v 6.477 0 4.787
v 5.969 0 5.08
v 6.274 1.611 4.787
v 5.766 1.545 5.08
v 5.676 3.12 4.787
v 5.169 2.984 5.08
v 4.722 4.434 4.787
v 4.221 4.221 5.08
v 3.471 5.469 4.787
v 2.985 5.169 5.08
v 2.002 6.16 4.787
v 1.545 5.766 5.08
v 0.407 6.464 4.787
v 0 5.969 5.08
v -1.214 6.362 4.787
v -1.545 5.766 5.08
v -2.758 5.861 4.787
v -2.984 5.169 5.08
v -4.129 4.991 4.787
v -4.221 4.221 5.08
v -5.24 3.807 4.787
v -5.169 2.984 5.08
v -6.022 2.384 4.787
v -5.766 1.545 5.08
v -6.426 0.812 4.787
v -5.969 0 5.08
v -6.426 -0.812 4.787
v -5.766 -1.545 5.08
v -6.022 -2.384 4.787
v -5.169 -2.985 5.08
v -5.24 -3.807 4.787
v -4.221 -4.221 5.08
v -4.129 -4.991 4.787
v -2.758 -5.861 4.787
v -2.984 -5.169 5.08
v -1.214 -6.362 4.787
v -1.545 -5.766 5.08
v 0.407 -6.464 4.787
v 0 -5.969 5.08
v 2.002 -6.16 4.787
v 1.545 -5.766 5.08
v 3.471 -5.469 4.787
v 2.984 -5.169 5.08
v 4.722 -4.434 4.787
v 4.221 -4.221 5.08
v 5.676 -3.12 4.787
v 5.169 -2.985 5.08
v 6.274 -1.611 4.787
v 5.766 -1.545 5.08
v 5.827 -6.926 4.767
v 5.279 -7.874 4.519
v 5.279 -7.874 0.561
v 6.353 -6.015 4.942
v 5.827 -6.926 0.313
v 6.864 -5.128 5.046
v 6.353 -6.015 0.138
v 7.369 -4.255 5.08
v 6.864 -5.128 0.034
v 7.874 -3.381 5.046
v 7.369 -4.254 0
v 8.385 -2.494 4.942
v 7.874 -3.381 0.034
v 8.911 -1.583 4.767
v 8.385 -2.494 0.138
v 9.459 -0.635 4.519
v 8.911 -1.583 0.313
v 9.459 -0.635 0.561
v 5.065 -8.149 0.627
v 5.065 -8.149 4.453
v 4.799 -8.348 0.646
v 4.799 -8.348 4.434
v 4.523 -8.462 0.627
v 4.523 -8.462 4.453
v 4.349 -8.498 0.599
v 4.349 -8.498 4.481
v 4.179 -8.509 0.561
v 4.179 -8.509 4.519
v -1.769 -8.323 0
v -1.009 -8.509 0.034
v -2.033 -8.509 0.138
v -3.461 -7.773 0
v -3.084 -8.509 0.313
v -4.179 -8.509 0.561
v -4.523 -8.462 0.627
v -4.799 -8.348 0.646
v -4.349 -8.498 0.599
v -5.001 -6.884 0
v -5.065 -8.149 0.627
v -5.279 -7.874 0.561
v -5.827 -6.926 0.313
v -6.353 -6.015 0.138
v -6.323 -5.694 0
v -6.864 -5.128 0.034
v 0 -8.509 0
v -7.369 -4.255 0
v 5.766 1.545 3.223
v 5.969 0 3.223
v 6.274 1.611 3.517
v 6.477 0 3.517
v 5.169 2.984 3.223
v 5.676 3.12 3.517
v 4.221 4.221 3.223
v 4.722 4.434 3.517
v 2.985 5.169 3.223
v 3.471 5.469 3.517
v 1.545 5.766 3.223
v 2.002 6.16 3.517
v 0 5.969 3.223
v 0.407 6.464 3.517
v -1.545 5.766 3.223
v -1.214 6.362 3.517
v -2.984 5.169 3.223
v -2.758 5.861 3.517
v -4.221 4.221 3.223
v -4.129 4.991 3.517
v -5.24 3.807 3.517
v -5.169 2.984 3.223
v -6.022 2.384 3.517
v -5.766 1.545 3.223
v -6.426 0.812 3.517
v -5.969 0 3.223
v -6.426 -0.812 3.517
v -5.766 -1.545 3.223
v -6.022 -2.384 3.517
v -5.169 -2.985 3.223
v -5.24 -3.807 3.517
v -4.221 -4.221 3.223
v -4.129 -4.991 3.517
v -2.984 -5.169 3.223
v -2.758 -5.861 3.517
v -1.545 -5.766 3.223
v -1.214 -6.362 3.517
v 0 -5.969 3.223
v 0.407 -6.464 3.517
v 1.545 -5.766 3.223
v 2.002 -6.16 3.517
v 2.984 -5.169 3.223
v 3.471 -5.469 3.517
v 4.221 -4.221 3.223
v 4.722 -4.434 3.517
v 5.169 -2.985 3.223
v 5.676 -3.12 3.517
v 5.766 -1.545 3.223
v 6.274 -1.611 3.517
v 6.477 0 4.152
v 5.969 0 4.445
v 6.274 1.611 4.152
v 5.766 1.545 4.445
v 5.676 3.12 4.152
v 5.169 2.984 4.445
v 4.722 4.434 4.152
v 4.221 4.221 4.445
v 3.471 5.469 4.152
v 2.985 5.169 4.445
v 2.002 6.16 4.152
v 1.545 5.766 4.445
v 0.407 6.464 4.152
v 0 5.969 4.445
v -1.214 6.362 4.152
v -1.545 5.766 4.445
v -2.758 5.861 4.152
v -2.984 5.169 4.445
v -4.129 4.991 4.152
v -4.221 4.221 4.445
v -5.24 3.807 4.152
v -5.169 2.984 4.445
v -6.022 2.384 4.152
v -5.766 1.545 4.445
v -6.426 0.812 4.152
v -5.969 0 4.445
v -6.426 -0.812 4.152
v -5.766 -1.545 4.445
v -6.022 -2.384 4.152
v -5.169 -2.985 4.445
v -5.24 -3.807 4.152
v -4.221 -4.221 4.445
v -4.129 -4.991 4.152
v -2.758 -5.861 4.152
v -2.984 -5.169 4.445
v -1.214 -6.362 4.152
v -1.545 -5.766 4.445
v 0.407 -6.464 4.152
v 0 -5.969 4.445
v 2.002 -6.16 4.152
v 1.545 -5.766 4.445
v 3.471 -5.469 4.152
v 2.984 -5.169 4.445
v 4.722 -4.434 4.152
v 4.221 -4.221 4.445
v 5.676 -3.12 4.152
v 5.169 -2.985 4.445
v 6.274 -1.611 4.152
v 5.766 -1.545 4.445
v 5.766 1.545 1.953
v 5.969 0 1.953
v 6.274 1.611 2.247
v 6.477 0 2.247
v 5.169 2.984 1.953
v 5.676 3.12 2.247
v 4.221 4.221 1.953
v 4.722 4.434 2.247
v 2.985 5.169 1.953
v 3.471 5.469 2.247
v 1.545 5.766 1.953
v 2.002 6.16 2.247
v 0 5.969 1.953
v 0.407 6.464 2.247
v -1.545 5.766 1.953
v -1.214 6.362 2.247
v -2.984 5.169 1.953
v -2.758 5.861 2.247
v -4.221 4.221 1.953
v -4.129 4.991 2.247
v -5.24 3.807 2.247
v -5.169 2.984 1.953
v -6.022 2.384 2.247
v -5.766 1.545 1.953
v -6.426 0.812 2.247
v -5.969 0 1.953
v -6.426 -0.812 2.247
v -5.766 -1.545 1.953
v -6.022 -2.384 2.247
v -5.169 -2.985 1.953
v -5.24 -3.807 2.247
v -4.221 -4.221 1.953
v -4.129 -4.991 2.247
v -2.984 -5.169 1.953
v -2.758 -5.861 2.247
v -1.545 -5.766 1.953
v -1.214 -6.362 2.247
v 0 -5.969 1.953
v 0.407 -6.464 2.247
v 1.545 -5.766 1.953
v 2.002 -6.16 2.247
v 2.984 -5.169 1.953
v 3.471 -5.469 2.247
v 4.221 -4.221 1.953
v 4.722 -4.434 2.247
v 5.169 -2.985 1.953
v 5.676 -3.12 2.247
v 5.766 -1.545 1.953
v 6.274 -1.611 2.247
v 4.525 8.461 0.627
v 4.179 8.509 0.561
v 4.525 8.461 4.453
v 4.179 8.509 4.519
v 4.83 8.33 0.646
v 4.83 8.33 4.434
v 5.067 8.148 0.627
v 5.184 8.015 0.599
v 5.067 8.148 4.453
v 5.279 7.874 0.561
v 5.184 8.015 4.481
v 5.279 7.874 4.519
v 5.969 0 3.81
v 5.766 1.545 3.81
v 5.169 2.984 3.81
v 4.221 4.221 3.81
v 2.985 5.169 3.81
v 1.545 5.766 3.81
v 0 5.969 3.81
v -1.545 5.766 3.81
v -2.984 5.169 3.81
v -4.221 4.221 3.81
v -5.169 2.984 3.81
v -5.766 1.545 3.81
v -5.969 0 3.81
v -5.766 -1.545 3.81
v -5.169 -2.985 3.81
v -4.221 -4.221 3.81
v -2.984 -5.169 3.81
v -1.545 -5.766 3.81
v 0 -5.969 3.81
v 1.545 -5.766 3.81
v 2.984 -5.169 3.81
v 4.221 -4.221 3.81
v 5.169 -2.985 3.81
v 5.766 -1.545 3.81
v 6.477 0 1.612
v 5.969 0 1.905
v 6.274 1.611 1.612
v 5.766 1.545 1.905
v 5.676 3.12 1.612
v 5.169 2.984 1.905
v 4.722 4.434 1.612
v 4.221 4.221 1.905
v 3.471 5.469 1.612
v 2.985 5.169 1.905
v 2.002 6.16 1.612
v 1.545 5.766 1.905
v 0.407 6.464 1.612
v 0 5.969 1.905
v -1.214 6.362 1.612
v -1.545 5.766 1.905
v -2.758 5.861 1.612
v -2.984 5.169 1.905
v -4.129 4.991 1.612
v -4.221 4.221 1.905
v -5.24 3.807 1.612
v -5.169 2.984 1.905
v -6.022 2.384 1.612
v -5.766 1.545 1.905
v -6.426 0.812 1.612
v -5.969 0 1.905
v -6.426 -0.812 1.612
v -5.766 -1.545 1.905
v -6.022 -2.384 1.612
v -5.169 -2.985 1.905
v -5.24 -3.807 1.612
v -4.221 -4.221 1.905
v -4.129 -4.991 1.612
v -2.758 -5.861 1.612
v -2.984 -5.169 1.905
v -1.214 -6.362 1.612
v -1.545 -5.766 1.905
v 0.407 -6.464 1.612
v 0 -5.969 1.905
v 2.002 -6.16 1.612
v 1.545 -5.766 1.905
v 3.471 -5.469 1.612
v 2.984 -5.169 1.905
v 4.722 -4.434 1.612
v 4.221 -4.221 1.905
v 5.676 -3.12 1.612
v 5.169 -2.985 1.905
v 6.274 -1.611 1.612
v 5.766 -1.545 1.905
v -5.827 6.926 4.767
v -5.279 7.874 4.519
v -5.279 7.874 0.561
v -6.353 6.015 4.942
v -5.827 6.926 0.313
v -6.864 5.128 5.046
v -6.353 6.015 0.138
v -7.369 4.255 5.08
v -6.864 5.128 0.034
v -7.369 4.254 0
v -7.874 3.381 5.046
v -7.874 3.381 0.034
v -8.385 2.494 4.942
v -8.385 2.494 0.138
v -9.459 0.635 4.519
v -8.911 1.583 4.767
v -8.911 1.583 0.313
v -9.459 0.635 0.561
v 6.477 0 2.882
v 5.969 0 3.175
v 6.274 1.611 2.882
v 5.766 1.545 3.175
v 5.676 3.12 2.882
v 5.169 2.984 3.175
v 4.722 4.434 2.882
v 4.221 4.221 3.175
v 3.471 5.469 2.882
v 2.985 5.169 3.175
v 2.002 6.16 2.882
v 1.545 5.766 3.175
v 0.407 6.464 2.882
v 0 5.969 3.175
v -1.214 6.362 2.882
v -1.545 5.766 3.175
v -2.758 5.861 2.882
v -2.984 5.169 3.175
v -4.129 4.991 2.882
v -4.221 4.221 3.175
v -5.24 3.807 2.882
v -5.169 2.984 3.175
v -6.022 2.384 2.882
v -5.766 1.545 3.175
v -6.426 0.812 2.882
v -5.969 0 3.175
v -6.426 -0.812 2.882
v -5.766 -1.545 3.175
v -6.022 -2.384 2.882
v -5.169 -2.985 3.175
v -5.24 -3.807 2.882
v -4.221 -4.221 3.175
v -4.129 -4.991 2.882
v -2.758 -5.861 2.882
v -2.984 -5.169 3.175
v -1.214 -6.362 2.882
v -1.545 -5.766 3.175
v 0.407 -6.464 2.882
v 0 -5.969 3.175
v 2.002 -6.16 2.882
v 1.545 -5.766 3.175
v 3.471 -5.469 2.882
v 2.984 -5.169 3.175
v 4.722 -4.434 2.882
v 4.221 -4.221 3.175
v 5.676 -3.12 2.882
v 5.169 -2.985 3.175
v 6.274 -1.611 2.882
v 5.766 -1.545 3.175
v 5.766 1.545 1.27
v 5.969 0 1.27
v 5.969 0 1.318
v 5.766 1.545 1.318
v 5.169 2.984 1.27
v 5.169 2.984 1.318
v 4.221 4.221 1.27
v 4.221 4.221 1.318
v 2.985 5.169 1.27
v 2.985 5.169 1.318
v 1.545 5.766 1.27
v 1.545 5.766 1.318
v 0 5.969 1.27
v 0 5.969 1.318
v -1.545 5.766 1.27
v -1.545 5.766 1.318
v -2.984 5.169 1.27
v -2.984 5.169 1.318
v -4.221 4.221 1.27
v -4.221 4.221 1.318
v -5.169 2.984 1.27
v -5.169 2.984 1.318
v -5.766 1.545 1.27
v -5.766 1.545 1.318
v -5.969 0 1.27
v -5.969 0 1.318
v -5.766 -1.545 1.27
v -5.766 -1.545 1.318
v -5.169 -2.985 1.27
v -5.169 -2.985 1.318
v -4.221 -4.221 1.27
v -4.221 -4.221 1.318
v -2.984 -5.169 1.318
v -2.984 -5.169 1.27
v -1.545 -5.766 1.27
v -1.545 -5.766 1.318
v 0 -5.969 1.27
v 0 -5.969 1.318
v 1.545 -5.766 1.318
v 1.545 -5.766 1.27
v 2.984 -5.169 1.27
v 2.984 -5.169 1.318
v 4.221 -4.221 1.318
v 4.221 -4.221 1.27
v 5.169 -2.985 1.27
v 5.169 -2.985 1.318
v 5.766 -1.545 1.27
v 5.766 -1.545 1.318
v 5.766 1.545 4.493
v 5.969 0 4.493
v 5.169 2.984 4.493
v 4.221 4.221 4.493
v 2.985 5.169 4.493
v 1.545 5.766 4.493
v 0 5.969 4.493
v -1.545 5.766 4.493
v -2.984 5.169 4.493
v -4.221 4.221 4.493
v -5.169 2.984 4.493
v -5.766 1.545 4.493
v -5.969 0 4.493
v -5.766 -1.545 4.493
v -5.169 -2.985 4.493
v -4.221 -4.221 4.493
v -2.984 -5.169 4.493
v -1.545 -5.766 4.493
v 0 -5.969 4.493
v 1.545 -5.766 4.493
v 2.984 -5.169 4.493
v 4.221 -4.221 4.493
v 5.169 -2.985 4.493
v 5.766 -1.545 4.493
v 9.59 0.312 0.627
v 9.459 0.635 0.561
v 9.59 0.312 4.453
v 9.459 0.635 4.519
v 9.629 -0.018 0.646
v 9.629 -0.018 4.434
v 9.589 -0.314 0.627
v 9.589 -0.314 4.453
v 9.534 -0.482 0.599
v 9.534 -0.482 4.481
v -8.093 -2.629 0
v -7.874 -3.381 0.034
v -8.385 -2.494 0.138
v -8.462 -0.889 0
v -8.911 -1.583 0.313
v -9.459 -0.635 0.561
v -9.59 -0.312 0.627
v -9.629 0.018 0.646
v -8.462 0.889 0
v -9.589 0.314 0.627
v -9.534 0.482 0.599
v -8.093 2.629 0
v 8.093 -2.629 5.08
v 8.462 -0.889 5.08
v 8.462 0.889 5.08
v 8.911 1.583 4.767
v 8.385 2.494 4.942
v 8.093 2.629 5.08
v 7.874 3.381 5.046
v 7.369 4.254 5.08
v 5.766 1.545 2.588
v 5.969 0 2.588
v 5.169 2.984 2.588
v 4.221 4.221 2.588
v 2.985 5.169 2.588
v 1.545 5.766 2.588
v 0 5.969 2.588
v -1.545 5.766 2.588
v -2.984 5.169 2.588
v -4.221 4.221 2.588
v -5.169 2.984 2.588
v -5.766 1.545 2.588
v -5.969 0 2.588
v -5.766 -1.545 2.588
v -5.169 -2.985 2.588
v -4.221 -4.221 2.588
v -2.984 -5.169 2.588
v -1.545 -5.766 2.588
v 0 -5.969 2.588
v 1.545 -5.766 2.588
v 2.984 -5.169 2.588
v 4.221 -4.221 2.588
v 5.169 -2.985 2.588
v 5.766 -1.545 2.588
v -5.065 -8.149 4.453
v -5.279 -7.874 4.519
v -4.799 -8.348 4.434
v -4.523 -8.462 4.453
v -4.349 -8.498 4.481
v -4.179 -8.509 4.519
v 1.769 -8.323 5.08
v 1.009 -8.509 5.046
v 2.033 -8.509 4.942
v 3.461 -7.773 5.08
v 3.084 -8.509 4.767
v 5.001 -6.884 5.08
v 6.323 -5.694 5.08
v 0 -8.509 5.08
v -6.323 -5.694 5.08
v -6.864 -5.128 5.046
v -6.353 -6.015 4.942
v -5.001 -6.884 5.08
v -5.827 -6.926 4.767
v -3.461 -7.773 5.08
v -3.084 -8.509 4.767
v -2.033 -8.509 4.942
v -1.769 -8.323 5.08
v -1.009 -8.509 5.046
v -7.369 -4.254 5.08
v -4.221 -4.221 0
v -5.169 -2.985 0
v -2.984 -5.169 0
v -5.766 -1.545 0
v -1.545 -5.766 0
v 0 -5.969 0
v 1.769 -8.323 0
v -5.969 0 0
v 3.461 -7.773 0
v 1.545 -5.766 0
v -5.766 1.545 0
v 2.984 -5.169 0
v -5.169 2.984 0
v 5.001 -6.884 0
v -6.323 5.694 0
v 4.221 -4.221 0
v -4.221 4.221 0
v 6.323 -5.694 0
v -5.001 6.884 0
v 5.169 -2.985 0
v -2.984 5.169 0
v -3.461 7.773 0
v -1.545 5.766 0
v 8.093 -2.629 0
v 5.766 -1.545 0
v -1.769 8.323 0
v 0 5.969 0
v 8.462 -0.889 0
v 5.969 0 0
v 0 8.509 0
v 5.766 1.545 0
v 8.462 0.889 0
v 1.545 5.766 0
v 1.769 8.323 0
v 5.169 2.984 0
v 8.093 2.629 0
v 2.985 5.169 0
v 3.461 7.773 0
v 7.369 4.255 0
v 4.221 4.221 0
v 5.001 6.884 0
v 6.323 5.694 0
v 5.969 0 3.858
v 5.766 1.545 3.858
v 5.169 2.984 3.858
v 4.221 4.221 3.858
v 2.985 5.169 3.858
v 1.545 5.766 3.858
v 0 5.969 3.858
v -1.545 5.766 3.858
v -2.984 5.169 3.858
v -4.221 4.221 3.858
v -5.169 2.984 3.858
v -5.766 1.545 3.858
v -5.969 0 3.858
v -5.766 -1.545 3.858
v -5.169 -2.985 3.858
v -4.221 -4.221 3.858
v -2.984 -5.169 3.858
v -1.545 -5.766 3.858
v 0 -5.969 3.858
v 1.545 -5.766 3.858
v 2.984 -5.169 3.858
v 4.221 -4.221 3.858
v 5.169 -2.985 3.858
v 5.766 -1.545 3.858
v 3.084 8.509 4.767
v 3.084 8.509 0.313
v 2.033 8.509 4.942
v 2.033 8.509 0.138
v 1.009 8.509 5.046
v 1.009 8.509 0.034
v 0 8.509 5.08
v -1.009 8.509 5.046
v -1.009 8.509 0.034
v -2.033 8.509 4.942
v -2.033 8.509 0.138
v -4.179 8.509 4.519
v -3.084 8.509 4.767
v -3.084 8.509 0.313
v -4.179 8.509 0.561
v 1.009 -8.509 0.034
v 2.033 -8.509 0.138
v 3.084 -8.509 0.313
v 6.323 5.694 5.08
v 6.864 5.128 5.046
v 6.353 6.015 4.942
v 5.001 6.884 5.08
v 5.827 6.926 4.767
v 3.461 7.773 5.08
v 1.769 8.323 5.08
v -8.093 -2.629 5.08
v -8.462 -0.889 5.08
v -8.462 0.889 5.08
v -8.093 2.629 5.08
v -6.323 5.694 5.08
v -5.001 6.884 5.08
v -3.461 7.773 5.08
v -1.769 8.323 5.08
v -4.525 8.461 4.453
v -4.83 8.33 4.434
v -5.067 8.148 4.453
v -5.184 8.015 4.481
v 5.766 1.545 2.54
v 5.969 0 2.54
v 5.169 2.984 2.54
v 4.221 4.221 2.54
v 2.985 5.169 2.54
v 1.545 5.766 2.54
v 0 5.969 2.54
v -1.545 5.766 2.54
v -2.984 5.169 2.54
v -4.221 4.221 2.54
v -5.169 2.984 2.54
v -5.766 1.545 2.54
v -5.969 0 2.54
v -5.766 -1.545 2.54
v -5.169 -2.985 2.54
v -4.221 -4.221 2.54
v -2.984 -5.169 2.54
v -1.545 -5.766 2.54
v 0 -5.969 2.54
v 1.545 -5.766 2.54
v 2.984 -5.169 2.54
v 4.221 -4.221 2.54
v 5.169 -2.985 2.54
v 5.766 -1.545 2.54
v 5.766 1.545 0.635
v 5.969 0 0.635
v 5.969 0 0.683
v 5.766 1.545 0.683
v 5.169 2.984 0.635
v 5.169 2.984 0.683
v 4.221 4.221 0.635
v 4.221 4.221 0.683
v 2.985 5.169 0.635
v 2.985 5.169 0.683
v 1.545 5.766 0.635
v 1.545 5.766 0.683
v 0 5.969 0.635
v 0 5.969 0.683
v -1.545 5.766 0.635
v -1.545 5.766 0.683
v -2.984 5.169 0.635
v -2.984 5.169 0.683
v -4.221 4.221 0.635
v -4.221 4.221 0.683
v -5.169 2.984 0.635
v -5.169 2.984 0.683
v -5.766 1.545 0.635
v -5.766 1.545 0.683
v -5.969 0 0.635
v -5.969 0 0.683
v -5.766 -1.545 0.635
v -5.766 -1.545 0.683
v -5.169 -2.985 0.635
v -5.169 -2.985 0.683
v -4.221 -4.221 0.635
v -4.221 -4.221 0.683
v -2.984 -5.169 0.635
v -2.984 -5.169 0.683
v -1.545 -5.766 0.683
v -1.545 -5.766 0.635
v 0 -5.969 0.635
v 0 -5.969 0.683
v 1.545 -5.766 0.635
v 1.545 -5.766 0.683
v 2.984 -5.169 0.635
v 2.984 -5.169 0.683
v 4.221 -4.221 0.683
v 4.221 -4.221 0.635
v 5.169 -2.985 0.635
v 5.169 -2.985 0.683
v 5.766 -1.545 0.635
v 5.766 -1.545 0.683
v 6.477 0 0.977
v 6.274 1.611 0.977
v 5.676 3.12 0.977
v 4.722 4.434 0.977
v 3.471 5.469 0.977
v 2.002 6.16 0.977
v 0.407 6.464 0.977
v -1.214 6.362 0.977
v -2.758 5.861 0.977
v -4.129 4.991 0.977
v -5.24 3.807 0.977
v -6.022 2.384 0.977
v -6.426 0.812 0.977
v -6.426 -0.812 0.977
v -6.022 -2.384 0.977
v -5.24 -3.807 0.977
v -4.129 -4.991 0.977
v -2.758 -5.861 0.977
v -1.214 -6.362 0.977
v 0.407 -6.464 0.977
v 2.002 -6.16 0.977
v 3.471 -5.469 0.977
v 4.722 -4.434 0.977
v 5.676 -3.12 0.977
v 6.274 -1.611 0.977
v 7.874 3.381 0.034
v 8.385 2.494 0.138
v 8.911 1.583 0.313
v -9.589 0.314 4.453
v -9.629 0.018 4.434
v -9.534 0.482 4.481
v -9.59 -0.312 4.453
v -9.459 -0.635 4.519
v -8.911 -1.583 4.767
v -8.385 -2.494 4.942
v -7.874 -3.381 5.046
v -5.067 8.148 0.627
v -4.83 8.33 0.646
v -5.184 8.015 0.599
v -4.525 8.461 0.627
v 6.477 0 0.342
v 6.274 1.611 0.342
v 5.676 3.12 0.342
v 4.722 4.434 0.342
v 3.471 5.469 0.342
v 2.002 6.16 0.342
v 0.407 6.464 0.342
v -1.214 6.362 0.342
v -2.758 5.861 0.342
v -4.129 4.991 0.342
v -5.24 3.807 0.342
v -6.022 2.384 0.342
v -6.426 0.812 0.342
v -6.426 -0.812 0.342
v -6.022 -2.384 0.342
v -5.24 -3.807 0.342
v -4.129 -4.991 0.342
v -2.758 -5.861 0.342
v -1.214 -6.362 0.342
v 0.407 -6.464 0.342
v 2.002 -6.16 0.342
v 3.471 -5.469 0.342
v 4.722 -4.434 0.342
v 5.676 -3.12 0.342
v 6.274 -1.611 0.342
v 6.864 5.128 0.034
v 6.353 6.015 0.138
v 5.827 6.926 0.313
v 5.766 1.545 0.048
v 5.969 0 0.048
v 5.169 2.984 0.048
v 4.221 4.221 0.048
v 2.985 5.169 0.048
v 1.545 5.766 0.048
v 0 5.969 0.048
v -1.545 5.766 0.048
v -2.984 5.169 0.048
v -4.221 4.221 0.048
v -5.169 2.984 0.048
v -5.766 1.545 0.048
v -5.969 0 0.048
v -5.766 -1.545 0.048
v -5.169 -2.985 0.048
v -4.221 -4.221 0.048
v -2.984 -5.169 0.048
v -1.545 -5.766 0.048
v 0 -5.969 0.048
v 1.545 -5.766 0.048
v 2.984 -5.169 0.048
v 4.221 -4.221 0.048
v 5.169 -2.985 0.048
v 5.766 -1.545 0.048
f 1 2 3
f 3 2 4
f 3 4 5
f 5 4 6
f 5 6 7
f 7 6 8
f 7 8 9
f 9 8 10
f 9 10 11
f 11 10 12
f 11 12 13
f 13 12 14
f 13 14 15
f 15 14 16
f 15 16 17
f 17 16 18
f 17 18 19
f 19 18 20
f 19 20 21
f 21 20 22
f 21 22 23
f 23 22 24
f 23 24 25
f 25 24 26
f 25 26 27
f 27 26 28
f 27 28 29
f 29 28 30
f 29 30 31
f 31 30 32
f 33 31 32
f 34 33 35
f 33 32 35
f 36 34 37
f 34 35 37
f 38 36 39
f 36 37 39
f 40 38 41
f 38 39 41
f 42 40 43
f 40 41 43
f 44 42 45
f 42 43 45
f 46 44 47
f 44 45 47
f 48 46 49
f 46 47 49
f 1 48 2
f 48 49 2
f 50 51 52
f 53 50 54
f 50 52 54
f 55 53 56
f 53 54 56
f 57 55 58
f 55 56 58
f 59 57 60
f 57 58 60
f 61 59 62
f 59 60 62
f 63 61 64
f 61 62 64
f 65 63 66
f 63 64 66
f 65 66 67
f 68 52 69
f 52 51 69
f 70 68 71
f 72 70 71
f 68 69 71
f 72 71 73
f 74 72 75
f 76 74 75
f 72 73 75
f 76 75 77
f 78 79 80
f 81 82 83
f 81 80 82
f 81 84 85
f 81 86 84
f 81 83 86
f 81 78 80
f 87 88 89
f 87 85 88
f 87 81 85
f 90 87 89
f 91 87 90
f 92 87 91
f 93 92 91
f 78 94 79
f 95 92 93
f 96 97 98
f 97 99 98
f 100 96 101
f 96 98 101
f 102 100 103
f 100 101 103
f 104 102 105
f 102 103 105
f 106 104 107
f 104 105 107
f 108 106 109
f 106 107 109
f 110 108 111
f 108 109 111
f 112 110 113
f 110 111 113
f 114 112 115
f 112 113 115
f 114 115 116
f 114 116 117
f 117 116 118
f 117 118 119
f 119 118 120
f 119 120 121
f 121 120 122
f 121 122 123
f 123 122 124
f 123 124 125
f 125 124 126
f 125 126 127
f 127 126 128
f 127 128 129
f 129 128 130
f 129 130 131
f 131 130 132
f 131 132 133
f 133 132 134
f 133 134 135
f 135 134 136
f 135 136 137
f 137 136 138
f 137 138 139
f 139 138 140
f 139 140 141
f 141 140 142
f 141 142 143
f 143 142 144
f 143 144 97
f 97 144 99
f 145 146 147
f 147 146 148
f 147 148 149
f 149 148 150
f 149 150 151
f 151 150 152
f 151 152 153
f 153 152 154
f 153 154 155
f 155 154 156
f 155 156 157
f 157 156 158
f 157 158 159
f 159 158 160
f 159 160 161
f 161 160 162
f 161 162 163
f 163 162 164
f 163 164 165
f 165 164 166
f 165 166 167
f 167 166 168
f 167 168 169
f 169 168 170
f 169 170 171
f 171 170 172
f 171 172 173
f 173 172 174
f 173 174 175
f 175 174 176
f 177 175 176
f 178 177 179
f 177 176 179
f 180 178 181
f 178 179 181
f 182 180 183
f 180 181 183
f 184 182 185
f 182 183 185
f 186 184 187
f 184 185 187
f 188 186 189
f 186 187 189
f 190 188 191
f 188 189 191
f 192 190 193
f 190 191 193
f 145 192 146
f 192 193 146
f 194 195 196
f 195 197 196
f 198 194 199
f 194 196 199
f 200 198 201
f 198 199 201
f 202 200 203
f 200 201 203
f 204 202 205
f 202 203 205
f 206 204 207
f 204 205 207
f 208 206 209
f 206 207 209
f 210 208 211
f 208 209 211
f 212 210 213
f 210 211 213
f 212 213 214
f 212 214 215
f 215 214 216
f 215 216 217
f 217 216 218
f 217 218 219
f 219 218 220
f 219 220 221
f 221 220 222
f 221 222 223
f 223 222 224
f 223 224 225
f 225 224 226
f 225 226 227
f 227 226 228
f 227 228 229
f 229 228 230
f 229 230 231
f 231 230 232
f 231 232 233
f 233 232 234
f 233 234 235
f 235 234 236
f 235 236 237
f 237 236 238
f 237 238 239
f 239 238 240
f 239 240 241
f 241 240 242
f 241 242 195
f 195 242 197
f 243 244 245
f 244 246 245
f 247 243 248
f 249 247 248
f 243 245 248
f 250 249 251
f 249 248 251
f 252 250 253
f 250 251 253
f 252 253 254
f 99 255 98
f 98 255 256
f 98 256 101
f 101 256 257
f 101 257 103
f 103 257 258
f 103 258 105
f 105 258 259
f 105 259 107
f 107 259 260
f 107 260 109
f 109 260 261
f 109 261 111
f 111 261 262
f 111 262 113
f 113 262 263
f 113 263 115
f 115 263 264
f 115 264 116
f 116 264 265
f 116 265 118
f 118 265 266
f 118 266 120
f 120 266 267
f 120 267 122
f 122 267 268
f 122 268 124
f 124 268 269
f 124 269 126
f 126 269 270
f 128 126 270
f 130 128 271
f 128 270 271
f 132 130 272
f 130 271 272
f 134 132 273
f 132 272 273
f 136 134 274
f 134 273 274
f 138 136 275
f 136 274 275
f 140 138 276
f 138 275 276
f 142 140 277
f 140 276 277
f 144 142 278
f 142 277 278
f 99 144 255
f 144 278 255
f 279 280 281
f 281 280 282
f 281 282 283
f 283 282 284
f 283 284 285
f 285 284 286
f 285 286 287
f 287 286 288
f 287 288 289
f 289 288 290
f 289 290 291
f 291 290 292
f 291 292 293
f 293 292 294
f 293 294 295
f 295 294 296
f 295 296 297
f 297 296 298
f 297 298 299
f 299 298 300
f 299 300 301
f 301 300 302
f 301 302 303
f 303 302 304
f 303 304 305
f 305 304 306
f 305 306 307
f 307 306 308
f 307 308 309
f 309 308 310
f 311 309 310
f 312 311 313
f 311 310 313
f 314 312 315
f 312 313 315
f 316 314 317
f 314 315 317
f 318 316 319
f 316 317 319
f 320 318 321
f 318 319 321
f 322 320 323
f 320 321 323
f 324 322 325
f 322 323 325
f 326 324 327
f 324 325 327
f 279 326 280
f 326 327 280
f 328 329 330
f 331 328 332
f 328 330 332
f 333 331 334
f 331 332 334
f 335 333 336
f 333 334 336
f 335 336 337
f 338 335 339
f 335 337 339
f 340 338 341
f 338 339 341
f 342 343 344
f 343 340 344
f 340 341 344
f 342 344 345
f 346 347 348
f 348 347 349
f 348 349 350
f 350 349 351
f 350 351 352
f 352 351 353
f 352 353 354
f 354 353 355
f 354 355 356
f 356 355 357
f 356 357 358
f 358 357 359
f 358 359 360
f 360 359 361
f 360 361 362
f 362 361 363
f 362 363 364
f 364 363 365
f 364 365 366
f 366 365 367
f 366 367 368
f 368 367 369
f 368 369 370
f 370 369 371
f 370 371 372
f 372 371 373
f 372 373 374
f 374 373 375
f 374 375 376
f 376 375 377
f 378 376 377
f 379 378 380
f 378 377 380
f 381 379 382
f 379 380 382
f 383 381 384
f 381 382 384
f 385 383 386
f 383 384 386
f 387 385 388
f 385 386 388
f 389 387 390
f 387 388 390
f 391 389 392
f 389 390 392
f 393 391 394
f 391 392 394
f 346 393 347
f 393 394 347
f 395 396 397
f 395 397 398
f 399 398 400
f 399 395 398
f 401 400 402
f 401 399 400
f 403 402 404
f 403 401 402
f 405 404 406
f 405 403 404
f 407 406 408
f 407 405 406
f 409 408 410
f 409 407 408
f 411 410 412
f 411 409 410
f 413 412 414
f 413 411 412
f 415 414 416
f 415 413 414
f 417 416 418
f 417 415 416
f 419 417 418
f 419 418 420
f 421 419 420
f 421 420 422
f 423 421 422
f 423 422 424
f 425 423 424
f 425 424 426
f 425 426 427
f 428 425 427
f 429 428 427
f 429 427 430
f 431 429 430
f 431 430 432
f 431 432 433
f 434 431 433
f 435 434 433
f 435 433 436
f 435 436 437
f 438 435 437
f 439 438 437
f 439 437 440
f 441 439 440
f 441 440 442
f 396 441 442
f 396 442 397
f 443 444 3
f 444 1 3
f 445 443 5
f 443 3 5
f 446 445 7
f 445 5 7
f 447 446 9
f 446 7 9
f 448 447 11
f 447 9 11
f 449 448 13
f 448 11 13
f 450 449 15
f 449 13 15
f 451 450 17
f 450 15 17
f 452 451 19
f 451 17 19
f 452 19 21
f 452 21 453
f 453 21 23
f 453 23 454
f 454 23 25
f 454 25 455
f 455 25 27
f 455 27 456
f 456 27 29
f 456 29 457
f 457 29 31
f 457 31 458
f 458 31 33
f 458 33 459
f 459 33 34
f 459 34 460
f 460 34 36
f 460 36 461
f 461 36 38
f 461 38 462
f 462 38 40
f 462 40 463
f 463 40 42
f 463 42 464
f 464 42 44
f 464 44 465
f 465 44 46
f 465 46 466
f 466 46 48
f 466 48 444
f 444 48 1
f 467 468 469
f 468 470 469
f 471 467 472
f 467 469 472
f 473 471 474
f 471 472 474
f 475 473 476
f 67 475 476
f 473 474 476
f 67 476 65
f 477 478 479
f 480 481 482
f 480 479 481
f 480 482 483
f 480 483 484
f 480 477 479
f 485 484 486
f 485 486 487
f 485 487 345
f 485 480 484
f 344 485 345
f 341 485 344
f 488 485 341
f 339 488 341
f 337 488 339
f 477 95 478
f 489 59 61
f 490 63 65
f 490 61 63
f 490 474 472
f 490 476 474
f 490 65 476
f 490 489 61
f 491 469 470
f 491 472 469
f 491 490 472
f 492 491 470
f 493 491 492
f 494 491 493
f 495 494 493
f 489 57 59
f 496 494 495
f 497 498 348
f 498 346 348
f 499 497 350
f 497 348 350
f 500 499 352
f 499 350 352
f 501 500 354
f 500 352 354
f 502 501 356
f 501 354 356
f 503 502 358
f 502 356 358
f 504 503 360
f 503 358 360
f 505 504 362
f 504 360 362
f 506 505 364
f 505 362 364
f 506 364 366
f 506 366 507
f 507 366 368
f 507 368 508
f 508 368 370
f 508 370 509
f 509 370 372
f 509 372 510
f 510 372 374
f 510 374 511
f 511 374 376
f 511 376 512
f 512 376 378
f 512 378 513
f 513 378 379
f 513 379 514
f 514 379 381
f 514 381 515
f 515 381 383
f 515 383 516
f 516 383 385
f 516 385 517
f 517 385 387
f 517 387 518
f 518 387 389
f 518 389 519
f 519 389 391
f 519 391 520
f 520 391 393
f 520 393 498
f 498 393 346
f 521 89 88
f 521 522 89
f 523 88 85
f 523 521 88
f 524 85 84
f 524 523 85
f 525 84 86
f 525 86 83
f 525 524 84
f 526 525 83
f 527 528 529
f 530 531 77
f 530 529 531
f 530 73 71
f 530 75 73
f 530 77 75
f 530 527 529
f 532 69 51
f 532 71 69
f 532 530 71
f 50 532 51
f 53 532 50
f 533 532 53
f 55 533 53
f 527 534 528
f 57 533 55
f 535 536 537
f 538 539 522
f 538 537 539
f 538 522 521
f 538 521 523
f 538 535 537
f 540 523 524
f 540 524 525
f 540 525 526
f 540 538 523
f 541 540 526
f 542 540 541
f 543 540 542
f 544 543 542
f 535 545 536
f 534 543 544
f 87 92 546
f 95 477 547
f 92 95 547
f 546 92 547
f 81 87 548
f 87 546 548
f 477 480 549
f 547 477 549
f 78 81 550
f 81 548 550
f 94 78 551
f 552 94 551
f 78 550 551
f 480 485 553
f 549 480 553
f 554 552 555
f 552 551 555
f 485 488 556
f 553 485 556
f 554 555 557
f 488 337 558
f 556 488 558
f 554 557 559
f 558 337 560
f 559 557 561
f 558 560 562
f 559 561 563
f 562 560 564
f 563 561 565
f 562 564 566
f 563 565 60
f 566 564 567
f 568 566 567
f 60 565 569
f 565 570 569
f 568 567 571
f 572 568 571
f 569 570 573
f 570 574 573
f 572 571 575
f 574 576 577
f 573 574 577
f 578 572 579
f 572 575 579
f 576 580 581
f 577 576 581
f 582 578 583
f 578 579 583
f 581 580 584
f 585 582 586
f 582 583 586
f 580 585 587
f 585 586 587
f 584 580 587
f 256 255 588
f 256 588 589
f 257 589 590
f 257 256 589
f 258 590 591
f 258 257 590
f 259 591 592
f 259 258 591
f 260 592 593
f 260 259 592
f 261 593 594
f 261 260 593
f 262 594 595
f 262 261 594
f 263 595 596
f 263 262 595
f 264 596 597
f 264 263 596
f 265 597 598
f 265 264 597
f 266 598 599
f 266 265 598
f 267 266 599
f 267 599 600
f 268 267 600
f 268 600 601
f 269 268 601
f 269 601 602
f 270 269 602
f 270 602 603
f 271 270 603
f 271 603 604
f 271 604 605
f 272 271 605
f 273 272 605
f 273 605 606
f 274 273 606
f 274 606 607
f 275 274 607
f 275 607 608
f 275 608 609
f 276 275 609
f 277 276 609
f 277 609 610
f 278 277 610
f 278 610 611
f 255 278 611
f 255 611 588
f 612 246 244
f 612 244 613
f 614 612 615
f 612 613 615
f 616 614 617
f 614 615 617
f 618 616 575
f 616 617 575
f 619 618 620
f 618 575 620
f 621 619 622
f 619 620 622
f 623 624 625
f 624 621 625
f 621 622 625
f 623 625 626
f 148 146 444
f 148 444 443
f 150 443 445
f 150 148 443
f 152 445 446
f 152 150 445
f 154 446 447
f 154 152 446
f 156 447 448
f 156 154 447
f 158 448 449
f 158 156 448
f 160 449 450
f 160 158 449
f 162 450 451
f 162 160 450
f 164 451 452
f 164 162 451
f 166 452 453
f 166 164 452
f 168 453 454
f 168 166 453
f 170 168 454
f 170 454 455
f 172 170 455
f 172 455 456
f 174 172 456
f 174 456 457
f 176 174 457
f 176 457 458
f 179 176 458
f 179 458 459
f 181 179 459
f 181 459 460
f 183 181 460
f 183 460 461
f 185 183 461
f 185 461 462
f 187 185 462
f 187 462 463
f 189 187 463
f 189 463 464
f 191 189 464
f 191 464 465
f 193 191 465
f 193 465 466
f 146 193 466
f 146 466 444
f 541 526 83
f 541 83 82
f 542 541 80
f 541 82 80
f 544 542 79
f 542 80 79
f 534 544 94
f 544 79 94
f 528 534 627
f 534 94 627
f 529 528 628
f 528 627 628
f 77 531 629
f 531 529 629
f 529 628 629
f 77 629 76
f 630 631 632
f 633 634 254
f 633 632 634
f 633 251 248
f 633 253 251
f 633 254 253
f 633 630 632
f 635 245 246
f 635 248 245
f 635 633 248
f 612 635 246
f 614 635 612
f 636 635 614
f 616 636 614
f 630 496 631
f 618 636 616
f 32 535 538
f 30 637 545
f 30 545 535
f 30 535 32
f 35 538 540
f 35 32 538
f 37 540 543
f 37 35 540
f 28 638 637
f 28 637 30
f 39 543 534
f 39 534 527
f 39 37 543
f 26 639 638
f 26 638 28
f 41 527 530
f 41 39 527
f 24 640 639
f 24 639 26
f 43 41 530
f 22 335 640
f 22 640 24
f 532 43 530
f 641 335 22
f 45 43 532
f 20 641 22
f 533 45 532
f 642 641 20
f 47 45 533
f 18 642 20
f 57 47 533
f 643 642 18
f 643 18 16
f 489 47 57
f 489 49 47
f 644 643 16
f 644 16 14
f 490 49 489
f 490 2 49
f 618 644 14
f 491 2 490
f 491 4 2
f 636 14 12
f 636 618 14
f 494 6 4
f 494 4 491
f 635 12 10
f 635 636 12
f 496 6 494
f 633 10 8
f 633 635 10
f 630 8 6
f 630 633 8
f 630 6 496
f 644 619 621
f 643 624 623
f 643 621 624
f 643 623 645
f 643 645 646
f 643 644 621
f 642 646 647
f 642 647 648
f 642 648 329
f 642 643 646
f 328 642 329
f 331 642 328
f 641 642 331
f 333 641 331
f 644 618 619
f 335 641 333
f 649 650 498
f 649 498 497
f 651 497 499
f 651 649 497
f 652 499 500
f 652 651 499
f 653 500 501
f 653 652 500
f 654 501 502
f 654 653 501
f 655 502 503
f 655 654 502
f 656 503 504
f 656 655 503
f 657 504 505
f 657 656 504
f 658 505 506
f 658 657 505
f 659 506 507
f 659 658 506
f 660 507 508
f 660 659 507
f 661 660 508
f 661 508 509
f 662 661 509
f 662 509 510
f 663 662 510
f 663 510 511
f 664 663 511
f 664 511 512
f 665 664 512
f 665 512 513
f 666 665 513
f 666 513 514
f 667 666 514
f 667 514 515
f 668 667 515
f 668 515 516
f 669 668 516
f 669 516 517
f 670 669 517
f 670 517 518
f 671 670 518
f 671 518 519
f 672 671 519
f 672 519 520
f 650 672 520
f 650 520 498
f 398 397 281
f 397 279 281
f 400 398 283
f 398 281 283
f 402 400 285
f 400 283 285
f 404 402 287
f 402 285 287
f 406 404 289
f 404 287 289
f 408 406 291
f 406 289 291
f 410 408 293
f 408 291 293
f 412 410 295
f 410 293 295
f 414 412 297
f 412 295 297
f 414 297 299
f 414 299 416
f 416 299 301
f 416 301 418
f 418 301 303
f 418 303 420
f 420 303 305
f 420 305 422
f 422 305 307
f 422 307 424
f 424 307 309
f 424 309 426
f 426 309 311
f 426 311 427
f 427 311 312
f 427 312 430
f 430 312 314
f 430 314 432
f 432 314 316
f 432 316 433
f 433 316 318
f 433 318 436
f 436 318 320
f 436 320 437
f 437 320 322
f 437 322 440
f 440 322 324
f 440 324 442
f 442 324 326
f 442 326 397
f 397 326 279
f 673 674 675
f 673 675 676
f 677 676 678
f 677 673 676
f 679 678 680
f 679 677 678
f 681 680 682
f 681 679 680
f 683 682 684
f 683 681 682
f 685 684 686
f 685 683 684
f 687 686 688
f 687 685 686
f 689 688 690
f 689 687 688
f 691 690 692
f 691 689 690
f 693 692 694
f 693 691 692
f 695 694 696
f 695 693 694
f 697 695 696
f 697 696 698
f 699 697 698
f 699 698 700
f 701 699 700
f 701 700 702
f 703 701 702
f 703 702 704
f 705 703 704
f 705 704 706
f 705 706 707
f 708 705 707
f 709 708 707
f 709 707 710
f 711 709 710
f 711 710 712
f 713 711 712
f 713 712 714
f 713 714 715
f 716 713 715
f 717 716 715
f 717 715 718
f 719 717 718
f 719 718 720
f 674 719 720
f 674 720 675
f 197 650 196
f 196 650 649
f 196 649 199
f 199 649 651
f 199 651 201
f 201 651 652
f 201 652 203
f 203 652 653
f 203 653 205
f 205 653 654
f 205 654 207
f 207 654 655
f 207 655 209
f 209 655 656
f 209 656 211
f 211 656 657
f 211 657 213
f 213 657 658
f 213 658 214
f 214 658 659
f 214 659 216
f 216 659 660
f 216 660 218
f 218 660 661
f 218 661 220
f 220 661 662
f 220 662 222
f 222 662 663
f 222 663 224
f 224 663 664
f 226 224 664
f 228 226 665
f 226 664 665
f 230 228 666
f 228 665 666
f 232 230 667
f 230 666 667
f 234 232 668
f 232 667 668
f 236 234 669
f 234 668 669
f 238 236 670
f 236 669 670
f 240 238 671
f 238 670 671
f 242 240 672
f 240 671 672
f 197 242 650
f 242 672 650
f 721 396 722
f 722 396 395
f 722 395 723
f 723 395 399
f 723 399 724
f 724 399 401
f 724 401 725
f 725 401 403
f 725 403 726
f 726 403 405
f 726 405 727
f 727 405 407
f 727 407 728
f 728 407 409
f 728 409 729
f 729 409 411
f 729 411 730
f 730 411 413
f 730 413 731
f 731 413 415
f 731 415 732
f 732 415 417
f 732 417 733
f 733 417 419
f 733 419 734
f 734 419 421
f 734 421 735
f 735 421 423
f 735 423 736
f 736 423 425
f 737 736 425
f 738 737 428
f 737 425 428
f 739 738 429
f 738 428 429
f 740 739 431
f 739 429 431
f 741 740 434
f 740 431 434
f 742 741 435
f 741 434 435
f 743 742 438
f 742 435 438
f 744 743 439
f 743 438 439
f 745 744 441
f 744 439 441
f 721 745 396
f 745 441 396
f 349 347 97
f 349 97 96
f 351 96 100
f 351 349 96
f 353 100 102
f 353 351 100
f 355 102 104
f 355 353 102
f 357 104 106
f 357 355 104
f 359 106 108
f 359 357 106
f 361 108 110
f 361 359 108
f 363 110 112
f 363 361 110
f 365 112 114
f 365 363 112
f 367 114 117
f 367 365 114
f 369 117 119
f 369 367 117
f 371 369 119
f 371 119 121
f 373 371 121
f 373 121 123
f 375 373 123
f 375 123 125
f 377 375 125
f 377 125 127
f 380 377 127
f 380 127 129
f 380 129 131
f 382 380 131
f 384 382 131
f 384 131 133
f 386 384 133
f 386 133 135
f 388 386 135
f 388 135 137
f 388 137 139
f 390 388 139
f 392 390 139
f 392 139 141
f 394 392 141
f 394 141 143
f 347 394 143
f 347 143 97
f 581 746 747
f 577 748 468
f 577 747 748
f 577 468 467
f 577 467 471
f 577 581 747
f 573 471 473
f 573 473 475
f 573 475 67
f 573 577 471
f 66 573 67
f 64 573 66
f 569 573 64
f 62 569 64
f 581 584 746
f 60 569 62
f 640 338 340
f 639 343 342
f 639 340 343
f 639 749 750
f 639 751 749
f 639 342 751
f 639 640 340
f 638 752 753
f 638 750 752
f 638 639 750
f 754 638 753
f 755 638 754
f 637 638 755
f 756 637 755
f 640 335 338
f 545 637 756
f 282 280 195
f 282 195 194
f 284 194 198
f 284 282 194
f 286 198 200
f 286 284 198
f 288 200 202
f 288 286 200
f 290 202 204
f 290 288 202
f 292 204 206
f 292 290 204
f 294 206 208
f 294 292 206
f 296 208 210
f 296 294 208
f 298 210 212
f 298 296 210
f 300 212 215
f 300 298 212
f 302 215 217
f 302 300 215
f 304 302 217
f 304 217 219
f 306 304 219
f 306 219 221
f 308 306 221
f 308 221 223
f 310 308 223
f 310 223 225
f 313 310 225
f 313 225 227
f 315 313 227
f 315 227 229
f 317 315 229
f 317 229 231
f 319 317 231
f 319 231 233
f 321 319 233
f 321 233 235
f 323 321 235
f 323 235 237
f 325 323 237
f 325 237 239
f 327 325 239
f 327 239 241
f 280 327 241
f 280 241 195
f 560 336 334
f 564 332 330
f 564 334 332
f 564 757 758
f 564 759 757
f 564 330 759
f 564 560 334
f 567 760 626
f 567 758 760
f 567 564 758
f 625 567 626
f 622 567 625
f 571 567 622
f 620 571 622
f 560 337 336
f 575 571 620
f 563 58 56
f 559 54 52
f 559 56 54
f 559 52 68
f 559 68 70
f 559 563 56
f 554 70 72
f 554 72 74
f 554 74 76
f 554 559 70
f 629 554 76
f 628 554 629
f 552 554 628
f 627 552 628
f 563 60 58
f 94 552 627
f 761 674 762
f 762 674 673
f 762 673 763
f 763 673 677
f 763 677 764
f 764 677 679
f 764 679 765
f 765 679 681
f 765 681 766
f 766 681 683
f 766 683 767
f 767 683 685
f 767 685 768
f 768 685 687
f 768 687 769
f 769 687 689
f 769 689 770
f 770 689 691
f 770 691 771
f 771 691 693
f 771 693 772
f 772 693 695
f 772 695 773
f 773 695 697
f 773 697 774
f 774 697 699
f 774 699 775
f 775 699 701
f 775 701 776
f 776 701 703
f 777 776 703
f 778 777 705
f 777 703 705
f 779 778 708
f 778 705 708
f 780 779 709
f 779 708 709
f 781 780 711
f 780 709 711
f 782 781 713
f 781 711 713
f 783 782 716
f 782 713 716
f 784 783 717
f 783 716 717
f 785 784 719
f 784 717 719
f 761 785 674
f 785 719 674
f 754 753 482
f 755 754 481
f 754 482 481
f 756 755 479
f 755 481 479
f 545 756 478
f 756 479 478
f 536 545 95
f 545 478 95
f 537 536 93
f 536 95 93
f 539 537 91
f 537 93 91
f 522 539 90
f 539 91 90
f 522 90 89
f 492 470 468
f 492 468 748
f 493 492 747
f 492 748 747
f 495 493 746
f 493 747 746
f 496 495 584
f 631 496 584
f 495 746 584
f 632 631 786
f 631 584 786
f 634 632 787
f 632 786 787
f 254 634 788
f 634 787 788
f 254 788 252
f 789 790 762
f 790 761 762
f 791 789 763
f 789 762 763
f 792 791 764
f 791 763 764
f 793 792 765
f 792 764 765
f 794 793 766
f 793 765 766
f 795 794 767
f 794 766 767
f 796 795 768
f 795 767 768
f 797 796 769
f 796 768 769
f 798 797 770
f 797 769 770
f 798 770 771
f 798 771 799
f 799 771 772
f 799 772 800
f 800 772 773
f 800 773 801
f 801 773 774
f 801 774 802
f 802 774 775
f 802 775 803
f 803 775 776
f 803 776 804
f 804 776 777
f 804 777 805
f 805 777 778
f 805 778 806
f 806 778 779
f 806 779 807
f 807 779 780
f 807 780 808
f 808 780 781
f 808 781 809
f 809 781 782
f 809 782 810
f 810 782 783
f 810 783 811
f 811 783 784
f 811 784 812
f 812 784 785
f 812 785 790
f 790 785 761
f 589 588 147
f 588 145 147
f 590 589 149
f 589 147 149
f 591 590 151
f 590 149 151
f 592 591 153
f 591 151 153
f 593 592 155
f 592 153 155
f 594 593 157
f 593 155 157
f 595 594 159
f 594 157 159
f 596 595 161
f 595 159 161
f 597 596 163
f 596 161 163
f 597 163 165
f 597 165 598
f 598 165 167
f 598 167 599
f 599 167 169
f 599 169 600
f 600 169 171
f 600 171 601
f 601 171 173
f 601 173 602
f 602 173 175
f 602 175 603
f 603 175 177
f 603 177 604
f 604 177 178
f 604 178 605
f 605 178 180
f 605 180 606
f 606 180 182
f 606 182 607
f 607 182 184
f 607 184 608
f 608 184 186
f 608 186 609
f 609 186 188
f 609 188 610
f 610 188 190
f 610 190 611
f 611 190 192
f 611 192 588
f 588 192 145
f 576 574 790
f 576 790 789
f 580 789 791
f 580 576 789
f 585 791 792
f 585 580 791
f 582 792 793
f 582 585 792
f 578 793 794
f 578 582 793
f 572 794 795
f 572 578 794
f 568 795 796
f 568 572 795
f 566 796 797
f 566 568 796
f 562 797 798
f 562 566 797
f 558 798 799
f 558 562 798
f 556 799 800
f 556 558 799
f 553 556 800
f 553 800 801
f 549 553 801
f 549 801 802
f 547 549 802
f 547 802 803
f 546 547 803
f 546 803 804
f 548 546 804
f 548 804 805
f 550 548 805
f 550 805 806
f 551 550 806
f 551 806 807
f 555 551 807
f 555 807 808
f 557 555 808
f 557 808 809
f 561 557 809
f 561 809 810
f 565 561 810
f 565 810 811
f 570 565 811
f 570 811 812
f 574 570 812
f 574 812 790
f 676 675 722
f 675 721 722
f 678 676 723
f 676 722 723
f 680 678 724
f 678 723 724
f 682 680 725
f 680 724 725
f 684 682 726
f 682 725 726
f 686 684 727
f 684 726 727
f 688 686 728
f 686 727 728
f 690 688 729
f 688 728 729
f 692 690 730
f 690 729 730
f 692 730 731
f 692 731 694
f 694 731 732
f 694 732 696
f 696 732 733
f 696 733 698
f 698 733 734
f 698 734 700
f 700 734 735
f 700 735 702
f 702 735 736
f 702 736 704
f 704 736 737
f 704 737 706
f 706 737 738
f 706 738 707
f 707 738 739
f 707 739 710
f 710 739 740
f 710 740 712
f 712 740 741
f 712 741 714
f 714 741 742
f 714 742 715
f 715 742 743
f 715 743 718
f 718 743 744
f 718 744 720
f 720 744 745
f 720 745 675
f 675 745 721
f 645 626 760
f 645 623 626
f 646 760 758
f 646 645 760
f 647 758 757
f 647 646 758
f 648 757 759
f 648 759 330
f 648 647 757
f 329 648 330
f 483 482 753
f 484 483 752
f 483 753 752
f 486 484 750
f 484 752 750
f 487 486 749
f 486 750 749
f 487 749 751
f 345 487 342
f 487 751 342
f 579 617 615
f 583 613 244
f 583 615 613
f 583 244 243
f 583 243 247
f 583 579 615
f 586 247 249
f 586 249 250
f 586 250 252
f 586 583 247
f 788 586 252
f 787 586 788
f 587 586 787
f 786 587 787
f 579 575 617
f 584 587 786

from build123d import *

# Parameters (mm, degrees)
SKETCH1_R          = 5.969
EXTRUDE1_DEPTH     = 5.08
SKETCH2_OUTSIDE_W  = 48.01
SKETCH2_OUTSIDE_H  = 45.378
SKETCH2_OUTSIDE_R  = 8.509
CUT_EXTRUDE1_DEPTH = 6.08
CUT_EXTRUDE1_DRAFT = -60
SKETCH3_OUTSIDE_W  = 48.01
SKETCH3_OUTSIDE_H  = 45.378
SKETCH3_OUTSIDE_R  = 8.509
CUT_EXTRUDE2_DEPTH = 6.08
CUT_EXTRUDE2_DRAFT = -60
FILLET1_R          = 1.27
LPATTERN1_COUNT    = 8
LPATTERN1_PITCH    = 0.635


with BuildPart() as part:
    # Sketch1 → Extrude1 (new body)
    with BuildSketch(Plane.XY):
        Polygon((-9.825346881, 0), (-4.912673441, -8.509), (4.912673441, -8.509), (9.825346881, 0), (4.912673441, 8.509), (-4.912673441, 8.509), align=None)
        Circle(SKETCH1_R, mode=Mode.SUBTRACT)
    extrude(amount=EXTRUDE1_DEPTH)


with BuildPart() as cut_extrude1_tool:
    # Sketch2 outside → Cut-Extrude1 (with draft: the straight prism first)
    with BuildSketch(Plane.XY.offset(5.08)):
        Rectangle(SKETCH2_OUTSIDE_W, SKETCH2_OUTSIDE_H)
        Circle(SKETCH2_OUTSIDE_R, mode=Mode.SUBTRACT)
    extrude(amount=-CUT_EXTRUDE1_DEPTH)
    # Cut-Extrude1: the draft: its side faces are tilted about the plane it starts from
    cut_extrude1_sides = [cut_extrude1_tool.faces().sort_by_distance(p)[0] for p in [
        (0, -22.689, 2.04),
        (24.005, 0, 2.04),
        (0, 22.689, 2.04),
        (-24.005, 0, 2.04),
        (-8.509, 0, 2.04),
    ]]
    draft(cut_extrude1_sides, Plane.XY.offset(5.08), CUT_EXTRUDE1_DRAFT)


with BuildPart() as part_1:
    add(part.part)

    # Cut-Extrude1: cut by cut_extrude1_tool
    add(cut_extrude1_tool.part, mode=Mode.SUBTRACT)


with BuildPart() as cut_extrude2_tool:
    # Sketch3 outside → Cut-Extrude2 (with draft: the straight prism first)
    with BuildSketch(Plane(origin=(0, 0, 0), x_dir=(-1, 0, 0), z_dir=(0, 0, -1))):
        Rectangle(SKETCH3_OUTSIDE_W, SKETCH3_OUTSIDE_H)
        Circle(SKETCH3_OUTSIDE_R, mode=Mode.SUBTRACT)
    extrude(amount=-CUT_EXTRUDE2_DEPTH)
    # Cut-Extrude2: the draft: its side faces are tilted about the plane it starts from
    cut_extrude2_sides = [cut_extrude2_tool.faces().sort_by_distance(p)[0] for p in [
        (0, -22.689, 3.04),
        (-24.005, 0, 3.04),
        (0, 22.689, 3.04),
        (24.005, 0, 3.04),
        (8.509, 0, 3.04),
    ]]
    draft(cut_extrude2_sides, Plane(origin=(0, 0, 0), x_dir=(-1, 0, 0), z_dir=(0, 0, -1)), CUT_EXTRUDE2_DRAFT)


with BuildPart() as part_2:
    add(part_1.part)

    # Cut-Extrude2: cut by cut_extrude2_tool
    add(cut_extrude2_tool.part, mode=Mode.SUBTRACT)

    # Fillet1
    fillet1_edges = [part_2.edges().sort_by_distance(p)[0] for p in [
        (9.825346881, 0, 2.54),
        (4.912673441, -8.509, 2.54),
        (-4.912673441, -8.509, 2.54),
        (-9.825346881, 0, 2.54),
        (-4.912673441, 8.509, 2.54),
        (4.912673441, 8.509, 2.54),
    ]]
    fillet(fillet1_edges, radius=FILLET1_R)

    # Sketch4 → Cut-Revolve1 (revolve, cut)
    with BuildSketch(Plane(origin=(0, 0, 0), x_dir=(1, 0, 0), z_dir=(0, 1, 0)), mode=Mode.PRIVATE) as cut_revolve1_sk:
        Polygon((-5.969, -5.08), (-5.969, -4.493412127), (-6.477, -4.786706063), align=None)
    cut_revolve1 = revolve(cut_revolve1_sk.sketch.rotate(Axis((0, 0, 0), (0, 0, 1)), 180), axis=Axis((0, 0, 0), (0, 0, 1)), mode=Mode.SUBTRACT)  # turned: the seam where the file's is

    # LPattern1: Cut-Revolve1 ×8
    with Locations(*[(0, 0, -i * LPATTERN1_PITCH) for i in range(1, LPATTERN1_COUNT)]):
        add(cut_revolve1, mode=Mode.SUBTRACT)


solid = part_2.part
